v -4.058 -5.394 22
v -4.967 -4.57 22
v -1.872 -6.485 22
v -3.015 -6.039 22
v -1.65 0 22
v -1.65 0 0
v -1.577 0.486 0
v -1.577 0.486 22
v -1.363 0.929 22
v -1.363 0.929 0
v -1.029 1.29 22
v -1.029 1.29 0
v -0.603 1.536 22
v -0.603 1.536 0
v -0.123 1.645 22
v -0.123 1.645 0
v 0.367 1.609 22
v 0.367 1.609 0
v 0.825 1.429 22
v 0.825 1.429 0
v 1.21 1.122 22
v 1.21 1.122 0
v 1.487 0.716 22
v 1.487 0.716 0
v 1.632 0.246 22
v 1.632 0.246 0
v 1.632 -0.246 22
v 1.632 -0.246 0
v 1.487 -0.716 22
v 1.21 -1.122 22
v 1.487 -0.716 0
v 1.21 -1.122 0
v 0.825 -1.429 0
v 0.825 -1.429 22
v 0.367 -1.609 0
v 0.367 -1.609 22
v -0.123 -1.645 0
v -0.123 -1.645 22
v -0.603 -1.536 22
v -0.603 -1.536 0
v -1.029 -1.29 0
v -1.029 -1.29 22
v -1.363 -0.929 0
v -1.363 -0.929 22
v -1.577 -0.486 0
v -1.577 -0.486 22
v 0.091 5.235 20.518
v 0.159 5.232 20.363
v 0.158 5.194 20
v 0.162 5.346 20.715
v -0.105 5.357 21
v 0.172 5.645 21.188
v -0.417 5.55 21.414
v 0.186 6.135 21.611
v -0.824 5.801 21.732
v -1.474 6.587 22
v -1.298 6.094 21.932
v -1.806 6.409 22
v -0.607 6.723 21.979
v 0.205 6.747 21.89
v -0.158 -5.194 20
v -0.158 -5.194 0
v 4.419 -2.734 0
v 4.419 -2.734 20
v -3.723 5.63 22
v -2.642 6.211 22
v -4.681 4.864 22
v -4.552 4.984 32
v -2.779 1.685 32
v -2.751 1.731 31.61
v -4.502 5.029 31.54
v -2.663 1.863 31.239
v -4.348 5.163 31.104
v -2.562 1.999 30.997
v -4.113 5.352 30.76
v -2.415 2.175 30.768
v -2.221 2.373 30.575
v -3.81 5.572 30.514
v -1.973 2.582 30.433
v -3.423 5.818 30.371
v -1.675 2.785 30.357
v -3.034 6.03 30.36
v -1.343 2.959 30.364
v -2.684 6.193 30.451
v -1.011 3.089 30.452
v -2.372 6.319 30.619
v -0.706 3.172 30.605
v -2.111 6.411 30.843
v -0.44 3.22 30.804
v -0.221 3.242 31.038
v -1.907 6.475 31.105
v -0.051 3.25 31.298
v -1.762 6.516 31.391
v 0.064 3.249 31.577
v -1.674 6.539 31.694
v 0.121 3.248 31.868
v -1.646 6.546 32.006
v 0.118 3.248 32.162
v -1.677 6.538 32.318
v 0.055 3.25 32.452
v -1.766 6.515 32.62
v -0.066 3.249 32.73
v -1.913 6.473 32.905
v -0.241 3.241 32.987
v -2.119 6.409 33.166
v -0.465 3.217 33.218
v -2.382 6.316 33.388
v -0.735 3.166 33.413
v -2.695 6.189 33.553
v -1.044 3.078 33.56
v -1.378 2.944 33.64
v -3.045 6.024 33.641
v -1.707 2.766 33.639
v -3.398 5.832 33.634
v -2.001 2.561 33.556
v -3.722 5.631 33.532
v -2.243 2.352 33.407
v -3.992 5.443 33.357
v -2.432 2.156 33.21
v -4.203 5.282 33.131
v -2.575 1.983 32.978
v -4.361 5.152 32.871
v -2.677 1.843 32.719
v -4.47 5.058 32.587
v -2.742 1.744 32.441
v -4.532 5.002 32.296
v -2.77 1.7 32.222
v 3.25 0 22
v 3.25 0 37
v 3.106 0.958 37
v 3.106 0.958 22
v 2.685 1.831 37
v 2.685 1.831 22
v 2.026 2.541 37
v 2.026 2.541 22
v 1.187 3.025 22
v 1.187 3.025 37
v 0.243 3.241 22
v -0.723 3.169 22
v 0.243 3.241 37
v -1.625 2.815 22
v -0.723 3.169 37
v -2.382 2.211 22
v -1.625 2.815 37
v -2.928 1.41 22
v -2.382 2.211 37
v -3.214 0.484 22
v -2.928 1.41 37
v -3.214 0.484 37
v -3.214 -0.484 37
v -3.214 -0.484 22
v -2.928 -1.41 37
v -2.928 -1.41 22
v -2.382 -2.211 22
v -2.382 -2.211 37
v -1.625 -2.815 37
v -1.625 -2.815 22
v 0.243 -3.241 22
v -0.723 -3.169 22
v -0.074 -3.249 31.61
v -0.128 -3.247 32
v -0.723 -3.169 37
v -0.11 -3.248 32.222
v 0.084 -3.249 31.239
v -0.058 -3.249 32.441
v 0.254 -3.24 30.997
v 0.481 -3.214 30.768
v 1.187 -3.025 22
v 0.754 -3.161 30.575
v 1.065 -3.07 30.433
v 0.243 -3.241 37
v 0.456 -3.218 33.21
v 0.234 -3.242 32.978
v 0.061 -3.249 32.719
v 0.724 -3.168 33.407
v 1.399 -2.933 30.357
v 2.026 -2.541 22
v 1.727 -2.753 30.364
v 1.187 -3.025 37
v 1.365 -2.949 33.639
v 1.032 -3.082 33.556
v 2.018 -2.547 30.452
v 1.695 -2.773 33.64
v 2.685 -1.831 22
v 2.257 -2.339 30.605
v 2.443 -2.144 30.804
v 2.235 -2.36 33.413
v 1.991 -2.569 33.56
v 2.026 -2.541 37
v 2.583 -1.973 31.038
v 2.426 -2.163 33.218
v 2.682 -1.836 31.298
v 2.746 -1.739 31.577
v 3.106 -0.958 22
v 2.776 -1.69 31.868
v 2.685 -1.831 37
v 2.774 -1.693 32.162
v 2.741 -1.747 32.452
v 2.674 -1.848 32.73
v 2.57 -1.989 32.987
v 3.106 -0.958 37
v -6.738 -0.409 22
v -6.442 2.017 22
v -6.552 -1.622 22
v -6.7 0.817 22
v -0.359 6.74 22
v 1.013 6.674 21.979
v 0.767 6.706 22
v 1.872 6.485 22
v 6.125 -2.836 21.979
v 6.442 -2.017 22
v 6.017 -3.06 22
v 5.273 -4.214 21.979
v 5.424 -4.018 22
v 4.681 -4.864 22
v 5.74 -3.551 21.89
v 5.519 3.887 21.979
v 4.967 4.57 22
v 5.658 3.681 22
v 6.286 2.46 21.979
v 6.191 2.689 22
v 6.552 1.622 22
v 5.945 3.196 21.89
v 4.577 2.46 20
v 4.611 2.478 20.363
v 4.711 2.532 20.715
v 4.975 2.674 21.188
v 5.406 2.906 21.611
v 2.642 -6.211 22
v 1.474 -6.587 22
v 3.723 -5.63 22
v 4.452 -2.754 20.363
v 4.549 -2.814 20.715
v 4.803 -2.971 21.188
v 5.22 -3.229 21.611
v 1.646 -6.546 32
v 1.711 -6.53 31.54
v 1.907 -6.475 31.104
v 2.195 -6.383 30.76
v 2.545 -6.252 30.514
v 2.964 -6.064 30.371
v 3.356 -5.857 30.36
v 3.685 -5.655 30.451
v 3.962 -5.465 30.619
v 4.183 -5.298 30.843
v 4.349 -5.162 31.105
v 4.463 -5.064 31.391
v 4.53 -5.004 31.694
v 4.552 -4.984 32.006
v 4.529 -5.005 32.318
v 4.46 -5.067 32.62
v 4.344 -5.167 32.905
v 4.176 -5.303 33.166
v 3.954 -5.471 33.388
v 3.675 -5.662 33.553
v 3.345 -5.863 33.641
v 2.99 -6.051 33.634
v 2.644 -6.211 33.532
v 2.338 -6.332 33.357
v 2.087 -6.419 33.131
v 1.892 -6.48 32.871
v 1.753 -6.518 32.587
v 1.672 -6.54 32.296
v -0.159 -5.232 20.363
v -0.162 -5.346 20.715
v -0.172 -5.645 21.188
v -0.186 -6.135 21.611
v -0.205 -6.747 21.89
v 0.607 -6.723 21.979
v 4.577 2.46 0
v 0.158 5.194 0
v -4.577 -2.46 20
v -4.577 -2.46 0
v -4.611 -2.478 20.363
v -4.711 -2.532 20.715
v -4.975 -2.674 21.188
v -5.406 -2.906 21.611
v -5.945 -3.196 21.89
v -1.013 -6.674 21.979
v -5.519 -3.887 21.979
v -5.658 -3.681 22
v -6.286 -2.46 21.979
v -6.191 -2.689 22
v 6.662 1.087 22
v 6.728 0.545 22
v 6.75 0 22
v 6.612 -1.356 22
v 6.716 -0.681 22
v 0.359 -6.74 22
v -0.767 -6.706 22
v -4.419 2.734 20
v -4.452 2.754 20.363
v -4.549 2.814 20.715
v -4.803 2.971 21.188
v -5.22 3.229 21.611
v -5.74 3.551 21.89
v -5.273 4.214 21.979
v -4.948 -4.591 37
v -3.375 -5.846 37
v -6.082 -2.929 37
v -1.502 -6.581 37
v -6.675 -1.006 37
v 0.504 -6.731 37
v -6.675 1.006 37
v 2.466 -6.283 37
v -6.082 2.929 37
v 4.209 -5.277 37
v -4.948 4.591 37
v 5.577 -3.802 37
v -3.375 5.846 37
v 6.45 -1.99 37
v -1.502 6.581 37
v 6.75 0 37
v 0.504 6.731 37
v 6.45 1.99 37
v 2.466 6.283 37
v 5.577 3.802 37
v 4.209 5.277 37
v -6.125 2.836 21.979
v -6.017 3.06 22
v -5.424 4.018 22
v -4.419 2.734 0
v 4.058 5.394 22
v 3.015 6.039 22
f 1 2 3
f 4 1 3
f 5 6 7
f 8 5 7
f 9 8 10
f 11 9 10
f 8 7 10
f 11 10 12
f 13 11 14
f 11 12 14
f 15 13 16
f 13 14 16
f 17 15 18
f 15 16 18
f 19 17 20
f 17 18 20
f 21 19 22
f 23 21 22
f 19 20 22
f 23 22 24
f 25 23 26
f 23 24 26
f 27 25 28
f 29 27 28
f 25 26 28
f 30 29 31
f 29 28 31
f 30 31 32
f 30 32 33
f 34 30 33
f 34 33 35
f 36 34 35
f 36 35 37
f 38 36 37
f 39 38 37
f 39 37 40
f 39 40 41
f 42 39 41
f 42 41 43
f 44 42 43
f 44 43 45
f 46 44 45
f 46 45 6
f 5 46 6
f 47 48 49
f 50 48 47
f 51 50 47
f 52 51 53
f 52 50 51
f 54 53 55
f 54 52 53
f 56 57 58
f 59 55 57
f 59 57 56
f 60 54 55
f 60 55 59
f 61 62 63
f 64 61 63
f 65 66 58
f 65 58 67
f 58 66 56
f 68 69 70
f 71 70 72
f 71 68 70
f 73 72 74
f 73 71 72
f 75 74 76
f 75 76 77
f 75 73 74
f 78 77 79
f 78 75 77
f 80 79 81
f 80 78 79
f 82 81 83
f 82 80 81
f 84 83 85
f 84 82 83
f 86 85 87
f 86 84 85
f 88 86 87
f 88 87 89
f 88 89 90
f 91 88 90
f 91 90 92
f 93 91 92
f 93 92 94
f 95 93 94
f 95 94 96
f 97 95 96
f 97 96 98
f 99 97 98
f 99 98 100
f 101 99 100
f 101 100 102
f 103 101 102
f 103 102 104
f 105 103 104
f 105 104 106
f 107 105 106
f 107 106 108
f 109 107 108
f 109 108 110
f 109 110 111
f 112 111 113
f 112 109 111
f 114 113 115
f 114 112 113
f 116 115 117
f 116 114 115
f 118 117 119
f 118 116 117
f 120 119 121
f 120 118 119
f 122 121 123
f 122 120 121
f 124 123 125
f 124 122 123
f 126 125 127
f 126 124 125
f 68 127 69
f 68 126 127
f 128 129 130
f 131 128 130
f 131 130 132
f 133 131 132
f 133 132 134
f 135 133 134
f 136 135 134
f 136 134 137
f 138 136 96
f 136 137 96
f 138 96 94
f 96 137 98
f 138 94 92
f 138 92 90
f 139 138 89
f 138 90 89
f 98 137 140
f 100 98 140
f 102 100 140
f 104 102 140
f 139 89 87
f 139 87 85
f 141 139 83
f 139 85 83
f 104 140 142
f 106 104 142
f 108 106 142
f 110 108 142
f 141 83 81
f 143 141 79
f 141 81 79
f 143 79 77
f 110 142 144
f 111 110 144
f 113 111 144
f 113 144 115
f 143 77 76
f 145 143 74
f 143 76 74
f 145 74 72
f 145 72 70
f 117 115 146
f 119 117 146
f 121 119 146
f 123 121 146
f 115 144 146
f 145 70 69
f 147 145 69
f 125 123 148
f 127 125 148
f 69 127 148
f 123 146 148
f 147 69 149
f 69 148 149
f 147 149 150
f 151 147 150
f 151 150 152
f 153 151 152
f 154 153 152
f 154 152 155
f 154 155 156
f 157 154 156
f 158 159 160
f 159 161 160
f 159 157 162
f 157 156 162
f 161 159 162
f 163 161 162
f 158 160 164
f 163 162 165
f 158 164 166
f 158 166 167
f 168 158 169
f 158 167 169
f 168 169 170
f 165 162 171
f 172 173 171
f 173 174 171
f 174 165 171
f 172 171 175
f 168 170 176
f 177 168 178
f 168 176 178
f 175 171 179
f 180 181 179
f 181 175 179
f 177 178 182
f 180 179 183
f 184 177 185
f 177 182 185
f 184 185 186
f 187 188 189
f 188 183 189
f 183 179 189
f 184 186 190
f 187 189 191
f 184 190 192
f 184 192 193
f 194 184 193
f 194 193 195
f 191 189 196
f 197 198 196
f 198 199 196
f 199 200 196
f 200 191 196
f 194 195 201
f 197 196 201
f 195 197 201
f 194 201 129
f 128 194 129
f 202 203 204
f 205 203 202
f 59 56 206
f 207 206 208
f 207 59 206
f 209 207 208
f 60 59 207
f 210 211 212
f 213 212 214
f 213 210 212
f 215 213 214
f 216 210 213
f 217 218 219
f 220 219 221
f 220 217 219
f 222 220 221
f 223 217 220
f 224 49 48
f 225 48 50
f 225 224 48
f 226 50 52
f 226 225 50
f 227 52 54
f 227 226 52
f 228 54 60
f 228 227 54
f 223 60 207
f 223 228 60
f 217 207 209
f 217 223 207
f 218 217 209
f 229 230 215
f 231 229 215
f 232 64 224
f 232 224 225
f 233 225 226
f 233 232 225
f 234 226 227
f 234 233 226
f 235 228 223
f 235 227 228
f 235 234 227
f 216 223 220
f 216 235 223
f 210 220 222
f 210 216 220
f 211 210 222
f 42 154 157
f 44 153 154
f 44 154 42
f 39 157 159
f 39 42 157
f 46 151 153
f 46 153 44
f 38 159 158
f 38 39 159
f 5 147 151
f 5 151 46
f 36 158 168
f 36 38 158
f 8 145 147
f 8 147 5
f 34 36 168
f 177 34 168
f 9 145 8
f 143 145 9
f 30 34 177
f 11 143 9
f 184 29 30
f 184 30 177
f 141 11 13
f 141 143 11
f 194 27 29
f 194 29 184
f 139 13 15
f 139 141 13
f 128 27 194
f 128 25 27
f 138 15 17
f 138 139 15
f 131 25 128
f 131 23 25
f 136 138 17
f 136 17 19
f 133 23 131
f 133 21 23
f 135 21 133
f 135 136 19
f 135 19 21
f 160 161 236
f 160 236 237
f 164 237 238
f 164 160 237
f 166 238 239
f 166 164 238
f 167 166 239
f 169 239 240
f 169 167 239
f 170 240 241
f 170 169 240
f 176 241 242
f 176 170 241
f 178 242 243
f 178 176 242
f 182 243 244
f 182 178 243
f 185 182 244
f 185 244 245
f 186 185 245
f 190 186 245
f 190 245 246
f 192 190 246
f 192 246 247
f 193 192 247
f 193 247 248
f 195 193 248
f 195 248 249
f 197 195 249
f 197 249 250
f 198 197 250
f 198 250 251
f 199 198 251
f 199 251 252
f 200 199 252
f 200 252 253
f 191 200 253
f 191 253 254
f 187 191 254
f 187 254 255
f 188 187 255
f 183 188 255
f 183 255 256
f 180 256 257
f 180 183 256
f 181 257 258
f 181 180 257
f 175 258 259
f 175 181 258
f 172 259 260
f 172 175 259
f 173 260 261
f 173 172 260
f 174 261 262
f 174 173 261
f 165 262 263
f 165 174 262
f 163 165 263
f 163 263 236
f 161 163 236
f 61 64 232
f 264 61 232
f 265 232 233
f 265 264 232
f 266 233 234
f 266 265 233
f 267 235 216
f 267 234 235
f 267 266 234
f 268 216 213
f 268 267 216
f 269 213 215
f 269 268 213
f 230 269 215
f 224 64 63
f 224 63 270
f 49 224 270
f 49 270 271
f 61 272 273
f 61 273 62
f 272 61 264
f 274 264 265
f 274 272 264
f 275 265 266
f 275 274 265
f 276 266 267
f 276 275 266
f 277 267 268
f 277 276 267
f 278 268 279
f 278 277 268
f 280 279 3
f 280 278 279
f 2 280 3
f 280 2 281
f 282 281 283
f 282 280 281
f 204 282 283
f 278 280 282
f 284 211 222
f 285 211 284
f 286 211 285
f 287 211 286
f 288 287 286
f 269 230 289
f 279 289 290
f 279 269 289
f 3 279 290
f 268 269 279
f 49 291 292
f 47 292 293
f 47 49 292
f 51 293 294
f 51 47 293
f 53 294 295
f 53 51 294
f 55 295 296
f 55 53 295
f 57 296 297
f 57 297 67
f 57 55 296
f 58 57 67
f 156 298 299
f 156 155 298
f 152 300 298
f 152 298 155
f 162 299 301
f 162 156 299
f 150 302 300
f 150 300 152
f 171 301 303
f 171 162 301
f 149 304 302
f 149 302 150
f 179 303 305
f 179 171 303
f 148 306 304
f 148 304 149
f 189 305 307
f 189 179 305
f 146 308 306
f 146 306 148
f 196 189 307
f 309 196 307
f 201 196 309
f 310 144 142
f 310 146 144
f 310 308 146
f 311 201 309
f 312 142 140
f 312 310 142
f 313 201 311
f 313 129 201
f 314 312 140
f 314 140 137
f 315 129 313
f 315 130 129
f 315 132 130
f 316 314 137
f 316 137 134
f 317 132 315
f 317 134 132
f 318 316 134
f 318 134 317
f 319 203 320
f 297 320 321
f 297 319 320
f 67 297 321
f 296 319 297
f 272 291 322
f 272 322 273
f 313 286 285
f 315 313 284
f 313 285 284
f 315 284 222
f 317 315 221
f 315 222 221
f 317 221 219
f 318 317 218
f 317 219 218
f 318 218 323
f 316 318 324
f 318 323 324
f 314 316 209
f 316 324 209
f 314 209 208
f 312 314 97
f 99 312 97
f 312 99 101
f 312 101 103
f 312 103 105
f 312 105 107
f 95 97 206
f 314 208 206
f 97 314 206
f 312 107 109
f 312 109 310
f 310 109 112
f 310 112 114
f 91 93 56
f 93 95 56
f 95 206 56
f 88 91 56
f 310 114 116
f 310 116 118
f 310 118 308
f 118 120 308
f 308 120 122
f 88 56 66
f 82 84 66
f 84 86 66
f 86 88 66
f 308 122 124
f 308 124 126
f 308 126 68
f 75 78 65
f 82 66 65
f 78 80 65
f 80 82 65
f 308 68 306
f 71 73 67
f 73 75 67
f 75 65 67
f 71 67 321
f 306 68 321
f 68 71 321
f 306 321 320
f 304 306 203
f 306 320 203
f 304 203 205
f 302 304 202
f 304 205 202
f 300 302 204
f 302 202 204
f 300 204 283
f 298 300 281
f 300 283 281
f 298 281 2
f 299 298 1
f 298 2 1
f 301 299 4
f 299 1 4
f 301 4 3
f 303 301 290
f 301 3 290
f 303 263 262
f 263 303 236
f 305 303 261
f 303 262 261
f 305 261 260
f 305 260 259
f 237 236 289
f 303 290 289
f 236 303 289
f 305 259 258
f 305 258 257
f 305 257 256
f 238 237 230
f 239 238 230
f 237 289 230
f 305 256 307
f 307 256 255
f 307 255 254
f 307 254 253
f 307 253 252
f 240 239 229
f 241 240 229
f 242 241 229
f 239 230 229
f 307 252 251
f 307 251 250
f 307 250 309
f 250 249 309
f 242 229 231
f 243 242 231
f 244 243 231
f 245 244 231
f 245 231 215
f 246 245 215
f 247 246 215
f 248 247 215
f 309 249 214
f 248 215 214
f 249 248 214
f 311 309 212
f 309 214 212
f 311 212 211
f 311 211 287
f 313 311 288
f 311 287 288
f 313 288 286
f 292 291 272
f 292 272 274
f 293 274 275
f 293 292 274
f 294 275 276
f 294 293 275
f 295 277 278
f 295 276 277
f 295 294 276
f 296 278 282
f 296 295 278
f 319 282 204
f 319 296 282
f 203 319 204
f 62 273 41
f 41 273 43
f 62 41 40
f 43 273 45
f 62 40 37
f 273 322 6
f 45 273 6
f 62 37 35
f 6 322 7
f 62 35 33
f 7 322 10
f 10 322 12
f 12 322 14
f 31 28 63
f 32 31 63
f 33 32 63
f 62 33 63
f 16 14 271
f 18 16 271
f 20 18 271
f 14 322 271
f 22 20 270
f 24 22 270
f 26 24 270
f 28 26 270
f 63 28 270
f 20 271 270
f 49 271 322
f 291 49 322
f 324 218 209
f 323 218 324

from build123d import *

# Parameters (mm, degrees)
BOSS_EXTRUDE1_DEPTH     = 22
SKETCH2_R               = 6.75
BOSS_EXTRUDE2_DEPTH     = 15
SKETCH3_R               = 3.25
CUT_EXTRUDE1_DEPTH      = 15
FILLET2_R               = 2
CUT_EXTRUDE2_DEPTH      = 15
CUT_EXTRUDE2_DEPTH_BACK = 15
SKETCH8_R               = 1.65
SKETCH9_R               = 1.65
CUT_EXTRUDE3_DEPTH      = 23


with BuildPart() as part:
    # Sketch1 → Boss-Extrude1 (new body)
    with BuildSketch(Plane.XY):
        Polygon((4.576818883, 2.460229443), (0.157788245, 5.193756143), (-4.419030638, 2.7335267), (-4.576818883, -2.460229443), (-0.157788245, -5.193756143), (4.419030638, -2.7335267), align=None)
    extrude(amount=BOSS_EXTRUDE1_DEPTH)

    # Sketch2 → Boss-Extrude2 (add)
    with BuildSketch(Plane.XY.offset(22)):
        Circle(SKETCH2_R)
    extrude(amount=BOSS_EXTRUDE2_DEPTH)

    # Sketch3 → Cut-Extrude1 (cut)
    with BuildSketch(Plane.XY.offset(37)):
        Circle(SKETCH3_R)
    extrude(amount=-CUT_EXTRUDE1_DEPTH, mode=Mode.SUBTRACT)

    # Fillet2
    # the kernel refuses this fillet: 2 mm, written as the material it adds along each edge
    with BuildSketch(Plane(origin=(-4.267198829, 7.731220878, 22), x_dir=(-0.9995388356967246, 0.03036636188344194, 0), z_dir=(-0.03036636188344194, -0.9995388356967246, 0))) as fillet2_piece_1_section:
        with BuildLine():
            CenterArc((FILLET2_R, FILLET2_R), FILLET2_R, 180, 90)
            Line((0, FILLET2_R), (0, 0))
            Line((0, 0), (FILLET2_R, 0))
        make_face()
    fillet2_piece_1 = extrude(amount=15.196152423, mode=Mode.PRIVATE)
    fillet2_piece_1 = split(fillet2_piece_1, bisect_by=Plane(origin=(-5.873586192, 1.951642931, 21.520073337), z_dir=(0.4734713770367902, -0.8808092047242045, 0)), keep=Keep.TOP, mode=Mode.PRIVATE)
    fillet2_piece_1 = split(fillet2_piece_1, bisect_by=Plane(origin=(-5.981227867, -1.591489267, 21.520073337), z_dir=(0.5260674586599344, 0.8504428428407627, 0)), keep=Keep.TOP, mode=Mode.PRIVATE)
    add(fillet2_piece_1)
    with BuildSketch(Plane(origin=(-8.829033097, 0.17010785, 22), x_dir=(-0.5260674586599344, -0.8504428428407628, 0), z_dir=(0.8504428428407627, -0.5260674586599344, 0))) as fillet2_piece_2_section:
        with BuildLine():
            CenterArc((FILLET2_R, FILLET2_R), FILLET2_R, 180, 90)
            Line((0, FILLET2_R), (0, 0))
            Line((0, 0), (FILLET2_R, 0))
        make_face()
    fillet2_piece_2 = extrude(amount=15.196152423, mode=Mode.PRIVATE)
    fillet2_piece_2 = split(fillet2_piece_2, bisect_by=Plane(origin=(-4.626965453, -4.110853388, 21.520073337), z_dir=(0.9995388356967246, -0.03036636188344194, 0)), keep=Keep.TOP, mode=Mode.PRIVATE)
    fillet2_piece_2 = split(fillet2_piece_2, bisect_by=Plane(origin=(-1.612343798, -5.975639912, 21.520073337), z_dir=(-0.47347137703679026, 0.8808092047242045, 0)), keep=Keep.TOP, mode=Mode.PRIVATE)
    add(fillet2_piece_2)
    with BuildSketch(Plane(origin=(-4.561834268, -7.561113028, 22), x_dir=(0.47347137703679026, -0.8808092047242045, 0), z_dir=(0.8808092047242045, 0.47347137703679026, 0))) as fillet2_piece_3_section:
        with BuildLine():
            CenterArc((FILLET2_R, FILLET2_R), FILLET2_R, 180, 90)
            Line((0, FILLET2_R), (0, 0))
            Line((0, 0), (FILLET2_R, 0))
        make_face()
    fillet2_piece_3 = extrude(amount=15.196152423, mode=Mode.PRIVATE)
    fillet2_piece_3 = split(fillet2_piece_3, bisect_by=Plane(origin=(1.246620739, -6.062496319, 21.520073337), z_dir=(0.5260674586599344, 0.8504428428407627, 0)), keep=Keep.TOP, mode=Mode.PRIVATE)
    fillet2_piece_3 = split(fillet2_piece_3, bisect_by=Plane(origin=(4.368884068, -4.384150645, 21.520073337), z_dir=(-0.9995388356967246, 0.030366361883441762, 0)), keep=Keep.TOP, mode=Mode.PRIVATE)
    add(fillet2_piece_3)
    with BuildSketch(Plane(origin=(4.267198829, -7.731220878, 22), x_dir=(0.9995388356967246, -0.030366361883441762, 0), z_dir=(0.030366361883441762, 0.9995388356967246, 0))) as fillet2_piece_4_section:
        with BuildLine():
            CenterArc((FILLET2_R, FILLET2_R), FILLET2_R, 180, 90)
            Line((0, FILLET2_R), (0, 0))
            Line((0, 0), (FILLET2_R, 0))
        make_face()
    fillet2_piece_4 = extrude(amount=15.196152423, mode=Mode.PRIVATE)
    fillet2_piece_4 = split(fillet2_piece_4, bisect_by=Plane(origin=(5.981227867, 1.591489267, 21.520073337), z_dir=(-0.5260674586599344, -0.8504428428407628, 0)), keep=Keep.TOP, mode=Mode.PRIVATE)
    fillet2_piece_4 = split(fillet2_piece_4, bisect_by=Plane(origin=(5.873586192, -1.951642931, 21.520073337), z_dir=(-0.47347137703679026, 0.8808092047242045, 0)), keep=Keep.TOP, mode=Mode.PRIVATE)
    add(fillet2_piece_4)
    with BuildSketch(Plane(origin=(8.829033097, -0.17010785, 22), x_dir=(0.5260674586599344, 0.8504428428407628, 0), z_dir=(-0.8504428428407628, 0.5260674586599344, 0))) as fillet2_piece_5_section:
        with BuildLine():
            CenterArc((FILLET2_R, FILLET2_R), FILLET2_R, 180, 90)
            Line((0, FILLET2_R), (0, 0))
            Line((0, 0), (FILLET2_R, 0))
        make_face()
    fillet2_piece_5 = extrude(amount=15.196152423, mode=Mode.PRIVATE)
    fillet2_piece_5 = split(fillet2_piece_5, bisect_by=Plane(origin=(4.626965453, 4.110853388, 21.520073337), z_dir=(-0.9995388356967246, 0.030366361883441762, 0)), keep=Keep.TOP, mode=Mode.PRIVATE)
    fillet2_piece_5 = split(fillet2_piece_5, bisect_by=Plane(origin=(1.612343798, 5.975639912, 21.520073337), z_dir=(0.4734713770367902, -0.8808092047242045, 0)), keep=Keep.TOP, mode=Mode.PRIVATE)
    add(fillet2_piece_5)
    with BuildSketch(Plane(origin=(4.561834268, 7.561113028, 22), x_dir=(-0.4734713770367902, 0.8808092047242045, 0), z_dir=(-0.8808092047242045, -0.4734713770367902, 0))) as fillet2_piece_6_section:
        with BuildLine():
            CenterArc((FILLET2_R, FILLET2_R), FILLET2_R, 180, 90)
            Line((0, FILLET2_R), (0, 0))
            Line((0, 0), (FILLET2_R, 0))
        make_face()
    fillet2_piece_6 = extrude(amount=15.196152423, mode=Mode.PRIVATE)
    fillet2_piece_6 = split(fillet2_piece_6, bisect_by=Plane(origin=(-1.246620739, 6.062496319, 21.520073337), z_dir=(-0.5260674586599344, -0.8504428428407628, 0)), keep=Keep.TOP, mode=Mode.PRIVATE)
    fillet2_piece_6 = split(fillet2_piece_6, bisect_by=Plane(origin=(-4.368884068, 4.384150645, 21.520073337), z_dir=(0.9995388356967246, -0.03036636188344194, 0)), keep=Keep.TOP, mode=Mode.PRIVATE)
    add(fillet2_piece_6)
    with BuildSketch(Plane(origin=(4.561834268, 7.561113028, 22), x_dir=(-0.4734713770367902, 0.8808092047242045, 0), z_dir=(-0.8808092047242045, -0.4734713770367902, 0))) as fillet2_piece_7a_section:
        with BuildLine():
            CenterArc((FILLET2_R, FILLET2_R), FILLET2_R, 180, 90)
            Line((0, FILLET2_R), (0, 0))
            Line((0, 0), (FILLET2_R, 0))
        make_face()
    fillet2_piece_7a = extrude(amount=15.196152423, mode=Mode.PRIVATE)
    fillet2_piece_7a = fillet2_piece_7a & Plane(origin=(0, 0, 21.516481321), x_dir=(1, 0, 0), z_dir=(0, 0, -1)) * Cylinder(6.75, 39, mode=Mode.PRIVATE)
    fillet2_piece_7a = split(fillet2_piece_7a, bisect_by=Plane(origin=(-4.422187766, 2.629606724, 21.516481321), z_dir=(-0.9995388356967246, 0.03036636188344194, 0)), keep=Keep.TOP, mode=Mode.PRIVATE)
    with BuildSketch(Plane(origin=(-4.267198829, 7.731220878, 22), x_dir=(-0.9995388356967246, 0.03036636188344194, 0), z_dir=(-0.03036636188344194, -0.9995388356967246, 0))) as fillet2_piece_7b_section:
        with BuildLine():
            CenterArc((FILLET2_R, FILLET2_R), FILLET2_R, 180, 90)
            Line((0, FILLET2_R), (0, 0))
            Line((0, 0), (FILLET2_R, 0))
        make_face()
    fillet2_piece_7b = extrude(amount=15.196152423, mode=Mode.PRIVATE)
    fillet2_piece_7b = fillet2_piece_7b & Plane(origin=(0, 0, 21.516480171), x_dir=(1, 0, 0), z_dir=(0, 0, -1)) * Cylinder(6.75, 39, mode=Mode.PRIVATE)
    fillet2_piece_7b = split(fillet2_piece_7b, bisect_by=Plane(origin=(-4.32745598, 2.782751866, 21.516480171), z_dir=(-0.4734713770367902, 0.8808092047242045, 0)), keep=Keep.TOP, mode=Mode.PRIVATE)
    fillet2_piece_7 = fillet2_piece_7a & fillet2_piece_7b
    add(fillet2_piece_7)
    with BuildSketch(Plane(origin=(-4.267198829, 7.731220878, 22), x_dir=(-0.9995388356967246, 0.03036636188344194, 0), z_dir=(-0.03036636188344194, -0.9995388356967246, 0))) as fillet2_piece_8a_section:
        with BuildLine():
            CenterArc((FILLET2_R, FILLET2_R), FILLET2_R, 180, 90)
            Line((0, FILLET2_R), (0, 0))
            Line((0, 0), (FILLET2_R, 0))
        make_face()
    fillet2_piece_8a = extrude(amount=15.196152423, mode=Mode.PRIVATE)
    fillet2_piece_8a = fillet2_piece_8a & Plane(origin=(0, 0, 21.516481321), x_dir=(1, 0, 0), z_dir=(0, 0, -1)) * Cylinder(6.75, 39, mode=Mode.PRIVATE)
    fillet2_piece_8a = split(fillet2_piece_8a, bisect_by=Plane(origin=(-4.488400107, -2.514923584, 21.516481321), z_dir=(-0.5260674586599344, -0.8504428428407627, 0)), keep=Keep.TOP, mode=Mode.PRIVATE)
    with BuildSketch(Plane(origin=(-8.829033097, 0.17010785, 22), x_dir=(-0.5260674586599344, -0.8504428428407628, 0), z_dir=(0.8504428428407627, -0.5260674586599344, 0))) as fillet2_piece_8b_section:
        with BuildLine():
            CenterArc((FILLET2_R, FILLET2_R), FILLET2_R, 180, 90)
            Line((0, FILLET2_R), (0, 0))
            Line((0, 0), (FILLET2_R, 0))
        make_face()
    fillet2_piece_8b = extrude(amount=15.196152423, mode=Mode.PRIVATE)
    fillet2_piece_8b = fillet2_piece_8b & Plane(origin=(0, 0, 21.516480171), x_dir=(1, 0, 0), z_dir=(0, 0, -1)) * Cylinder(6.75, 39, mode=Mode.PRIVATE)
    fillet2_piece_8b = split(fillet2_piece_8b, bisect_by=Plane(origin=(-4.573661798, -2.356310879, 21.516480171), z_dir=(-0.9995388356967246, 0.03036636188344194, 0)), keep=Keep.TOP, mode=Mode.PRIVATE)
    fillet2_piece_8 = fillet2_piece_8a & fillet2_piece_8b
    add(fillet2_piece_8)
    with BuildSketch(Plane(origin=(-8.829033097, 0.17010785, 22), x_dir=(-0.5260674586599344, -0.8504428428407628, 0), z_dir=(0.8504428428407627, -0.5260674586599344, 0))) as fillet2_piece_9a_section:
        with BuildLine():
            CenterArc((FILLET2_R, FILLET2_R), FILLET2_R, 180, 90)
            Line((0, FILLET2_R), (0, 0))
            Line((0, 0), (FILLET2_R, 0))
        make_face()
    fillet2_piece_9a = extrude(amount=15.196152423, mode=Mode.PRIVATE)
    fillet2_piece_9a = fillet2_piece_9a & Plane(origin=(0, 0, 21.516481321), x_dir=(1, 0, 0), z_dir=(0, 0, -1)) * Cylinder(6.75, 39, mode=Mode.PRIVATE)
    fillet2_piece_9a = split(fillet2_piece_9a, bisect_by=Plane(origin=(-0.066212341, -5.144530307, 21.516481321), z_dir=(0.47347137703679026, -0.8808092047242045, 0)), keep=Keep.TOP, mode=Mode.PRIVATE)
    with BuildSketch(Plane(origin=(-4.561834268, -7.561113028, 22), x_dir=(0.47347137703679026, -0.8808092047242045, 0), z_dir=(0.8808092047242045, 0.47347137703679026, 0))) as fillet2_piece_9b_section:
        with BuildLine():
            CenterArc((FILLET2_R, FILLET2_R), FILLET2_R, 180, 90)
            Line((0, FILLET2_R), (0, 0))
            Line((0, 0), (FILLET2_R, 0))
        make_face()
    fillet2_piece_9b = extrude(amount=15.196152423, mode=Mode.PRIVATE)
    fillet2_piece_9b = fillet2_piece_9b & Plane(origin=(0, 0, 21.516480171), x_dir=(1, 0, 0), z_dir=(0, 0, -1)) * Cylinder(6.75, 39, mode=Mode.PRIVATE)
    fillet2_piece_9b = split(fillet2_piece_9b, bisect_by=Plane(origin=(-0.246205818, -5.139062745, 21.516480171), z_dir=(-0.5260674586599344, -0.8504428428407627, 0)), keep=Keep.TOP, mode=Mode.PRIVATE)
    fillet2_piece_9 = fillet2_piece_9a & fillet2_piece_9b
    add(fillet2_piece_9)
    with BuildSketch(Plane(origin=(-4.561834268, -7.561113028, 22), x_dir=(0.47347137703679026, -0.8808092047242045, 0), z_dir=(0.8808092047242045, 0.47347137703679026, 0))) as fillet2_piece_10a_section:
        with BuildLine():
            CenterArc((FILLET2_R, FILLET2_R), FILLET2_R, 180, 90)
            Line((0, FILLET2_R), (0, 0))
            Line((0, 0), (FILLET2_R, 0))
        make_face()
    fillet2_piece_10a = extrude(amount=15.196152423, mode=Mode.PRIVATE)
    fillet2_piece_10a = fillet2_piece_10a & Plane(origin=(0, 0, 21.516481321), x_dir=(1, 0, 0), z_dir=(0, 0, -1)) * Cylinder(6.75, 39, mode=Mode.PRIVATE)
    fillet2_piece_10a = split(fillet2_piece_10a, bisect_by=Plane(origin=(4.422187766, -2.629606724, 21.516481321), z_dir=(0.9995388356967246, -0.030366361883441762, 0)), keep=Keep.TOP, mode=Mode.PRIVATE)
    with BuildSketch(Plane(origin=(4.267198829, -7.731220878, 22), x_dir=(0.9995388356967246, -0.030366361883441762, 0), z_dir=(0.030366361883441762, 0.9995388356967246, 0))) as fillet2_piece_10b_section:
        with BuildLine():
            CenterArc((FILLET2_R, FILLET2_R), FILLET2_R, 180, 90)
            Line((0, FILLET2_R), (0, 0))
            Line((0, 0), (FILLET2_R, 0))
        make_face()
    fillet2_piece_10b = extrude(amount=15.196152423, mode=Mode.PRIVATE)
    fillet2_piece_10b = fillet2_piece_10b & Plane(origin=(0, 0, 21.516480171), x_dir=(1, 0, 0), z_dir=(0, 0, -1)) * Cylinder(6.75, 39, mode=Mode.PRIVATE)
    fillet2_piece_10b = split(fillet2_piece_10b, bisect_by=Plane(origin=(4.32745598, -2.782751866, 21.516480171), z_dir=(0.47347137703679026, -0.8808092047242045, 0)), keep=Keep.TOP, mode=Mode.PRIVATE)
    fillet2_piece_10 = fillet2_piece_10a & fillet2_piece_10b
    add(fillet2_piece_10)
    with BuildSketch(Plane(origin=(8.829033097, -0.17010785, 22), x_dir=(0.5260674586599344, 0.8504428428407628, 0), z_dir=(-0.8504428428407628, 0.5260674586599344, 0))) as fillet2_piece_11a_section:
        with BuildLine():
            CenterArc((FILLET2_R, FILLET2_R), FILLET2_R, 180, 90)
            Line((0, FILLET2_R), (0, 0))
            Line((0, 0), (FILLET2_R, 0))
        make_face()
    fillet2_piece_11a = extrude(amount=15.196152423, mode=Mode.PRIVATE)
    fillet2_piece_11a = fillet2_piece_11a & Plane(origin=(0, 0, 21.516480171), x_dir=(1, 0, 0), z_dir=(0, 0, -1)) * Cylinder(6.75, 39, mode=Mode.PRIVATE)
    fillet2_piece_11a = split(fillet2_piece_11a, bisect_by=Plane(origin=(4.573661798, 2.356310879, 21.516480171), z_dir=(0.9995388356967246, -0.030366361883441762, 0)), keep=Keep.TOP, mode=Mode.PRIVATE)
    with BuildSketch(Plane(origin=(4.267198829, -7.731220878, 22), x_dir=(0.9995388356967246, -0.030366361883441762, 0), z_dir=(0.030366361883441762, 0.9995388356967246, 0))) as fillet2_piece_11b_section:
        with BuildLine():
            CenterArc((FILLET2_R, FILLET2_R), FILLET2_R, 180, 90)
            Line((0, FILLET2_R), (0, 0))
            Line((0, 0), (FILLET2_R, 0))
        make_face()
    fillet2_piece_11b = extrude(amount=15.196152423, mode=Mode.PRIVATE)
    fillet2_piece_11b = fillet2_piece_11b & Plane(origin=(0, 0, 21.516481321), x_dir=(1, 0, 0), z_dir=(0, 0, -1)) * Cylinder(6.75, 39, mode=Mode.PRIVATE)
    fillet2_piece_11b = split(fillet2_piece_11b, bisect_by=Plane(origin=(4.488400107, 2.514923584, 21.516481321), z_dir=(0.5260674586599344, 0.8504428428407628, 0)), keep=Keep.TOP, mode=Mode.PRIVATE)
    fillet2_piece_11 = fillet2_piece_11a & fillet2_piece_11b
    add(fillet2_piece_11)
    with BuildSketch(Plane(origin=(8.829033097, -0.17010785, 22), x_dir=(0.5260674586599344, 0.8504428428407628, 0), z_dir=(-0.8504428428407628, 0.5260674586599344, 0))) as fillet2_piece_12a_section:
        with BuildLine():
            CenterArc((FILLET2_R, FILLET2_R), FILLET2_R, 180, 90)
            Line((0, FILLET2_R), (0, 0))
            Line((0, 0), (FILLET2_R, 0))
        make_face()
    fillet2_piece_12a = extrude(amount=15.196152423, mode=Mode.PRIVATE)
    fillet2_piece_12a = fillet2_piece_12a & Plane(origin=(0, 0, 21.516481321), x_dir=(1, 0, 0), z_dir=(0, 0, -1)) * Cylinder(6.75, 39, mode=Mode.PRIVATE)
    fillet2_piece_12a = split(fillet2_piece_12a, bisect_by=Plane(origin=(0.066212341, 5.144530307, 21.516481321), z_dir=(-0.4734713770367902, 0.8808092047242045, 0)), keep=Keep.TOP, mode=Mode.PRIVATE)
    with BuildSketch(Plane(origin=(4.561834268, 7.561113028, 22), x_dir=(-0.4734713770367902, 0.8808092047242045, 0), z_dir=(-0.8808092047242045, -0.4734713770367902, 0))) as fillet2_piece_12b_section:
        with BuildLine():
            CenterArc((FILLET2_R, FILLET2_R), FILLET2_R, 180, 90)
            Line((0, FILLET2_R), (0, 0))
            Line((0, 0), (FILLET2_R, 0))
        make_face()
    fillet2_piece_12b = extrude(amount=15.196152423, mode=Mode.PRIVATE)
    fillet2_piece_12b = fillet2_piece_12b & Plane(origin=(0, 0, 21.516480171), x_dir=(1, 0, 0), z_dir=(0, 0, -1)) * Cylinder(6.75, 39, mode=Mode.PRIVATE)
    fillet2_piece_12b = split(fillet2_piece_12b, bisect_by=Plane(origin=(0.246205818, 5.139062745, 21.516480171), z_dir=(0.5260674586599344, 0.8504428428407628, 0)), keep=Keep.TOP, mode=Mode.PRIVATE)
    fillet2_piece_12 = fillet2_piece_12a & fillet2_piece_12b
    add(fillet2_piece_12)

    # Sketch8 → Cut-Extrude2 (cut, two sides: drawn at the far end of the back side and taken through both)
    with BuildSketch(Plane(origin=(2.130621197, -3.963641421, 0), x_dir=(-0.8808092047242045, -0.4734713770367903, 0), z_dir=(0.4734713770367903, -0.8808092047242045, 0)).offset(-CUT_EXTRUDE2_DEPTH_BACK)):
        with Locations((0, -32)):
            Circle(SKETCH8_R)
    extrude(amount=CUT_EXTRUDE2_DEPTH + CUT_EXTRUDE2_DEPTH_BACK, mode=Mode.SUBTRACT)

    # Sketch9 → Cut-Extrude3 (cut)
    with BuildSketch(Plane(origin=(0, 0, 0), x_dir=(-1, 0, 0), z_dir=(0, 0, -1))):
        Circle(SKETCH9_R)
    extrude(amount=-CUT_EXTRUDE3_DEPTH, mode=Mode.SUBTRACT)


solid = part.part
